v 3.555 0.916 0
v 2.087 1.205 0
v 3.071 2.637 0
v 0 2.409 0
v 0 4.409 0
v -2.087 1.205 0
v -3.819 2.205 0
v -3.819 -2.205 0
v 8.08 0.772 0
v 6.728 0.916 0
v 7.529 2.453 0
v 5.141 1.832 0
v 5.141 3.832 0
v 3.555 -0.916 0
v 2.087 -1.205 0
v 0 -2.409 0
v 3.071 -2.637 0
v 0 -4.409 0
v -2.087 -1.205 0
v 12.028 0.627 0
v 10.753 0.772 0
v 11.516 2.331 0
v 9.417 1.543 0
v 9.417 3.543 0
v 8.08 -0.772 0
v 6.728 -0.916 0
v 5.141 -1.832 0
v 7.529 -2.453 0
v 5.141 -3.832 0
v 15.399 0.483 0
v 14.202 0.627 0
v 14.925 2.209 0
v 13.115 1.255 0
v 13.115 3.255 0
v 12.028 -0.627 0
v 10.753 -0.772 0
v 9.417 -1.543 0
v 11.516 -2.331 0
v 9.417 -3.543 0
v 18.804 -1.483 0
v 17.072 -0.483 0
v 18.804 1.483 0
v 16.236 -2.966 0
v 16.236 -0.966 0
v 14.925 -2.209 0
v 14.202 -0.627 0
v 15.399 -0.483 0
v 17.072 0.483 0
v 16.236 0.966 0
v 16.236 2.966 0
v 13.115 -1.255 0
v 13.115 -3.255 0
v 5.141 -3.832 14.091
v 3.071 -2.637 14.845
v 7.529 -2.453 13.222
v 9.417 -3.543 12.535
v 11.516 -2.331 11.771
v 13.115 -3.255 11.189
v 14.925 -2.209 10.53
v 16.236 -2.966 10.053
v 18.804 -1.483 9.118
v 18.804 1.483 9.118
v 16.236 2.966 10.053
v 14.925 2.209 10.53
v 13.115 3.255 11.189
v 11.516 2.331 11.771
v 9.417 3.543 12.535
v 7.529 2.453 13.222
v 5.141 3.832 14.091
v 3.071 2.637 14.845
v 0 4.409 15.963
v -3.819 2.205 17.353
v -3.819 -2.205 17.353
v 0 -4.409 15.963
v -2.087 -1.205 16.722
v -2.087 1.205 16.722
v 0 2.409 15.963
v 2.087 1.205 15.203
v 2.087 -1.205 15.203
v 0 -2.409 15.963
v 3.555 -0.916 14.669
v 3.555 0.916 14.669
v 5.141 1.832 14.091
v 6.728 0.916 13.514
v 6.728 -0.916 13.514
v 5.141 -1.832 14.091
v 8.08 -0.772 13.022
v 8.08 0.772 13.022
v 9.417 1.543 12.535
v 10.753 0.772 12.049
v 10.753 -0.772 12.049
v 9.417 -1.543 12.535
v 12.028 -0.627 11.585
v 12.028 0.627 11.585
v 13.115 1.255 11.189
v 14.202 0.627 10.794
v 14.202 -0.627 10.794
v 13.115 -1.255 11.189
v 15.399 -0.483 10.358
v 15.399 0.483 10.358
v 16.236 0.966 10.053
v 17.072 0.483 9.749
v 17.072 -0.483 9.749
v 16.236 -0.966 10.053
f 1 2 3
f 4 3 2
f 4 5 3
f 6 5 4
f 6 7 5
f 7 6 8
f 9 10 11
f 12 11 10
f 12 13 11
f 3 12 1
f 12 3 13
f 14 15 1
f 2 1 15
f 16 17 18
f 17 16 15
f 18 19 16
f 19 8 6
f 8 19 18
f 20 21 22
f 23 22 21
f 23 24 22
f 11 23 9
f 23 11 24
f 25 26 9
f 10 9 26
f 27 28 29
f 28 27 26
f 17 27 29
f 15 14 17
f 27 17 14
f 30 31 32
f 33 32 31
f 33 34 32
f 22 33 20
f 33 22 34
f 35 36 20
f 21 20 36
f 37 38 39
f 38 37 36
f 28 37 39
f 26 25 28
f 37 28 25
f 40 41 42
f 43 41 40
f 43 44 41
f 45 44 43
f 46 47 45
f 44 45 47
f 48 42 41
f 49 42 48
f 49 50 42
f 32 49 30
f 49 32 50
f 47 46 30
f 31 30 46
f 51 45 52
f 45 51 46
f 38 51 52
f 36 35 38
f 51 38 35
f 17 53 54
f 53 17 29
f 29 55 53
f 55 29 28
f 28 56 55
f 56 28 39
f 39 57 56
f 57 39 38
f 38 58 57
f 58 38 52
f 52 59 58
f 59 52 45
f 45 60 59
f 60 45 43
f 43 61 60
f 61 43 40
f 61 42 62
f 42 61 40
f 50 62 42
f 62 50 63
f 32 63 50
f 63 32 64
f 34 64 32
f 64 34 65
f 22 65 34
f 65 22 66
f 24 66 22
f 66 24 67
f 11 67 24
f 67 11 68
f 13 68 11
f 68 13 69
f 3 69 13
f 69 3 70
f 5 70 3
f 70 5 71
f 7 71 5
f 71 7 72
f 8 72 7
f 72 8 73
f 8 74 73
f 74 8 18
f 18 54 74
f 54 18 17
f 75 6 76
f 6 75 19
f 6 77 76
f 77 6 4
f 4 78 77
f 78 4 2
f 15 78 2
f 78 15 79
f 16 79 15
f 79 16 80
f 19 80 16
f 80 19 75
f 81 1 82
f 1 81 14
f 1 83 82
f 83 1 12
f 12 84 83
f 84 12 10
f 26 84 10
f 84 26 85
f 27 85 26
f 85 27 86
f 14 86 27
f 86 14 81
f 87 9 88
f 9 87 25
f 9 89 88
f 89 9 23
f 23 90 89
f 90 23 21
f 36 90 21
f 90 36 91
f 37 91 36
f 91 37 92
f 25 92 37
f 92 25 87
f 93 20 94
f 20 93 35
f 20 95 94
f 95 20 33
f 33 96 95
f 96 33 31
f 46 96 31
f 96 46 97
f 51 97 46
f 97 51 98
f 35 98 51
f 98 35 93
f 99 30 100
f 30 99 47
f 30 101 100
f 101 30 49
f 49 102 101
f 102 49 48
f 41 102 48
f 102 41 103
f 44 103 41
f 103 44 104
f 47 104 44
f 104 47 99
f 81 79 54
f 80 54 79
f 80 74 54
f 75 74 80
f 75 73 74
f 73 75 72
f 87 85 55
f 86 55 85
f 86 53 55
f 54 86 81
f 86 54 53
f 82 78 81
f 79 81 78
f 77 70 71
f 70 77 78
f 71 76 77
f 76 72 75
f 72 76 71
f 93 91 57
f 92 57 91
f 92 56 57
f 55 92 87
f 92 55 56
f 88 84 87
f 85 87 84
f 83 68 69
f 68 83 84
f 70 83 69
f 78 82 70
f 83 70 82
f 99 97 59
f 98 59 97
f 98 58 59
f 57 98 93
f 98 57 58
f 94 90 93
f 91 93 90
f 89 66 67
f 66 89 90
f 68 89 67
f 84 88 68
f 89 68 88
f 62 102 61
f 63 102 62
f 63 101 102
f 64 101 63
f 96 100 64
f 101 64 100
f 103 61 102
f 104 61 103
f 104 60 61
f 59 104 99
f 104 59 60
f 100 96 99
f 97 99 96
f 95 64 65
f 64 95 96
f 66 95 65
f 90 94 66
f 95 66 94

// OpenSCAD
sizes = [ 4, 3, 2.5, 2, 1.5 ];
spacing = 1;
thickness = 2;
rotate = 30;
tolerance = 0.2;
height = 30;
cut_height = 15;
cut_angle = 20;

difference() {
  union() {
    linear_extrude(height)
    difference() {
      //hull() // comment out here for hexagon shape body
      hexes(sizes, spacing, thickness);
      hexes(sizes, spacing);
    }
  }

  rotate([0, cut_angle, 0])
  translate([0, 0, 500+cut_height])
  cube([1000, 1000, 1000], center=true);
}

module hexes(array, spacing=0, offset=0, index=0) {
  d = array[index] * 2 / tan(60) + tolerance;
  rotate([0, 0, rotate]) circle(r=d/2 + offset, $fn=6);
  
  if (index < len(array) - 1) {
    d_2 = array[index+1] * 2 / tan(60);
    translate([(d + d_2)/2 + spacing, 0, 0])
    hexes(array, spacing, offset, index + 1);
  }
  
}
